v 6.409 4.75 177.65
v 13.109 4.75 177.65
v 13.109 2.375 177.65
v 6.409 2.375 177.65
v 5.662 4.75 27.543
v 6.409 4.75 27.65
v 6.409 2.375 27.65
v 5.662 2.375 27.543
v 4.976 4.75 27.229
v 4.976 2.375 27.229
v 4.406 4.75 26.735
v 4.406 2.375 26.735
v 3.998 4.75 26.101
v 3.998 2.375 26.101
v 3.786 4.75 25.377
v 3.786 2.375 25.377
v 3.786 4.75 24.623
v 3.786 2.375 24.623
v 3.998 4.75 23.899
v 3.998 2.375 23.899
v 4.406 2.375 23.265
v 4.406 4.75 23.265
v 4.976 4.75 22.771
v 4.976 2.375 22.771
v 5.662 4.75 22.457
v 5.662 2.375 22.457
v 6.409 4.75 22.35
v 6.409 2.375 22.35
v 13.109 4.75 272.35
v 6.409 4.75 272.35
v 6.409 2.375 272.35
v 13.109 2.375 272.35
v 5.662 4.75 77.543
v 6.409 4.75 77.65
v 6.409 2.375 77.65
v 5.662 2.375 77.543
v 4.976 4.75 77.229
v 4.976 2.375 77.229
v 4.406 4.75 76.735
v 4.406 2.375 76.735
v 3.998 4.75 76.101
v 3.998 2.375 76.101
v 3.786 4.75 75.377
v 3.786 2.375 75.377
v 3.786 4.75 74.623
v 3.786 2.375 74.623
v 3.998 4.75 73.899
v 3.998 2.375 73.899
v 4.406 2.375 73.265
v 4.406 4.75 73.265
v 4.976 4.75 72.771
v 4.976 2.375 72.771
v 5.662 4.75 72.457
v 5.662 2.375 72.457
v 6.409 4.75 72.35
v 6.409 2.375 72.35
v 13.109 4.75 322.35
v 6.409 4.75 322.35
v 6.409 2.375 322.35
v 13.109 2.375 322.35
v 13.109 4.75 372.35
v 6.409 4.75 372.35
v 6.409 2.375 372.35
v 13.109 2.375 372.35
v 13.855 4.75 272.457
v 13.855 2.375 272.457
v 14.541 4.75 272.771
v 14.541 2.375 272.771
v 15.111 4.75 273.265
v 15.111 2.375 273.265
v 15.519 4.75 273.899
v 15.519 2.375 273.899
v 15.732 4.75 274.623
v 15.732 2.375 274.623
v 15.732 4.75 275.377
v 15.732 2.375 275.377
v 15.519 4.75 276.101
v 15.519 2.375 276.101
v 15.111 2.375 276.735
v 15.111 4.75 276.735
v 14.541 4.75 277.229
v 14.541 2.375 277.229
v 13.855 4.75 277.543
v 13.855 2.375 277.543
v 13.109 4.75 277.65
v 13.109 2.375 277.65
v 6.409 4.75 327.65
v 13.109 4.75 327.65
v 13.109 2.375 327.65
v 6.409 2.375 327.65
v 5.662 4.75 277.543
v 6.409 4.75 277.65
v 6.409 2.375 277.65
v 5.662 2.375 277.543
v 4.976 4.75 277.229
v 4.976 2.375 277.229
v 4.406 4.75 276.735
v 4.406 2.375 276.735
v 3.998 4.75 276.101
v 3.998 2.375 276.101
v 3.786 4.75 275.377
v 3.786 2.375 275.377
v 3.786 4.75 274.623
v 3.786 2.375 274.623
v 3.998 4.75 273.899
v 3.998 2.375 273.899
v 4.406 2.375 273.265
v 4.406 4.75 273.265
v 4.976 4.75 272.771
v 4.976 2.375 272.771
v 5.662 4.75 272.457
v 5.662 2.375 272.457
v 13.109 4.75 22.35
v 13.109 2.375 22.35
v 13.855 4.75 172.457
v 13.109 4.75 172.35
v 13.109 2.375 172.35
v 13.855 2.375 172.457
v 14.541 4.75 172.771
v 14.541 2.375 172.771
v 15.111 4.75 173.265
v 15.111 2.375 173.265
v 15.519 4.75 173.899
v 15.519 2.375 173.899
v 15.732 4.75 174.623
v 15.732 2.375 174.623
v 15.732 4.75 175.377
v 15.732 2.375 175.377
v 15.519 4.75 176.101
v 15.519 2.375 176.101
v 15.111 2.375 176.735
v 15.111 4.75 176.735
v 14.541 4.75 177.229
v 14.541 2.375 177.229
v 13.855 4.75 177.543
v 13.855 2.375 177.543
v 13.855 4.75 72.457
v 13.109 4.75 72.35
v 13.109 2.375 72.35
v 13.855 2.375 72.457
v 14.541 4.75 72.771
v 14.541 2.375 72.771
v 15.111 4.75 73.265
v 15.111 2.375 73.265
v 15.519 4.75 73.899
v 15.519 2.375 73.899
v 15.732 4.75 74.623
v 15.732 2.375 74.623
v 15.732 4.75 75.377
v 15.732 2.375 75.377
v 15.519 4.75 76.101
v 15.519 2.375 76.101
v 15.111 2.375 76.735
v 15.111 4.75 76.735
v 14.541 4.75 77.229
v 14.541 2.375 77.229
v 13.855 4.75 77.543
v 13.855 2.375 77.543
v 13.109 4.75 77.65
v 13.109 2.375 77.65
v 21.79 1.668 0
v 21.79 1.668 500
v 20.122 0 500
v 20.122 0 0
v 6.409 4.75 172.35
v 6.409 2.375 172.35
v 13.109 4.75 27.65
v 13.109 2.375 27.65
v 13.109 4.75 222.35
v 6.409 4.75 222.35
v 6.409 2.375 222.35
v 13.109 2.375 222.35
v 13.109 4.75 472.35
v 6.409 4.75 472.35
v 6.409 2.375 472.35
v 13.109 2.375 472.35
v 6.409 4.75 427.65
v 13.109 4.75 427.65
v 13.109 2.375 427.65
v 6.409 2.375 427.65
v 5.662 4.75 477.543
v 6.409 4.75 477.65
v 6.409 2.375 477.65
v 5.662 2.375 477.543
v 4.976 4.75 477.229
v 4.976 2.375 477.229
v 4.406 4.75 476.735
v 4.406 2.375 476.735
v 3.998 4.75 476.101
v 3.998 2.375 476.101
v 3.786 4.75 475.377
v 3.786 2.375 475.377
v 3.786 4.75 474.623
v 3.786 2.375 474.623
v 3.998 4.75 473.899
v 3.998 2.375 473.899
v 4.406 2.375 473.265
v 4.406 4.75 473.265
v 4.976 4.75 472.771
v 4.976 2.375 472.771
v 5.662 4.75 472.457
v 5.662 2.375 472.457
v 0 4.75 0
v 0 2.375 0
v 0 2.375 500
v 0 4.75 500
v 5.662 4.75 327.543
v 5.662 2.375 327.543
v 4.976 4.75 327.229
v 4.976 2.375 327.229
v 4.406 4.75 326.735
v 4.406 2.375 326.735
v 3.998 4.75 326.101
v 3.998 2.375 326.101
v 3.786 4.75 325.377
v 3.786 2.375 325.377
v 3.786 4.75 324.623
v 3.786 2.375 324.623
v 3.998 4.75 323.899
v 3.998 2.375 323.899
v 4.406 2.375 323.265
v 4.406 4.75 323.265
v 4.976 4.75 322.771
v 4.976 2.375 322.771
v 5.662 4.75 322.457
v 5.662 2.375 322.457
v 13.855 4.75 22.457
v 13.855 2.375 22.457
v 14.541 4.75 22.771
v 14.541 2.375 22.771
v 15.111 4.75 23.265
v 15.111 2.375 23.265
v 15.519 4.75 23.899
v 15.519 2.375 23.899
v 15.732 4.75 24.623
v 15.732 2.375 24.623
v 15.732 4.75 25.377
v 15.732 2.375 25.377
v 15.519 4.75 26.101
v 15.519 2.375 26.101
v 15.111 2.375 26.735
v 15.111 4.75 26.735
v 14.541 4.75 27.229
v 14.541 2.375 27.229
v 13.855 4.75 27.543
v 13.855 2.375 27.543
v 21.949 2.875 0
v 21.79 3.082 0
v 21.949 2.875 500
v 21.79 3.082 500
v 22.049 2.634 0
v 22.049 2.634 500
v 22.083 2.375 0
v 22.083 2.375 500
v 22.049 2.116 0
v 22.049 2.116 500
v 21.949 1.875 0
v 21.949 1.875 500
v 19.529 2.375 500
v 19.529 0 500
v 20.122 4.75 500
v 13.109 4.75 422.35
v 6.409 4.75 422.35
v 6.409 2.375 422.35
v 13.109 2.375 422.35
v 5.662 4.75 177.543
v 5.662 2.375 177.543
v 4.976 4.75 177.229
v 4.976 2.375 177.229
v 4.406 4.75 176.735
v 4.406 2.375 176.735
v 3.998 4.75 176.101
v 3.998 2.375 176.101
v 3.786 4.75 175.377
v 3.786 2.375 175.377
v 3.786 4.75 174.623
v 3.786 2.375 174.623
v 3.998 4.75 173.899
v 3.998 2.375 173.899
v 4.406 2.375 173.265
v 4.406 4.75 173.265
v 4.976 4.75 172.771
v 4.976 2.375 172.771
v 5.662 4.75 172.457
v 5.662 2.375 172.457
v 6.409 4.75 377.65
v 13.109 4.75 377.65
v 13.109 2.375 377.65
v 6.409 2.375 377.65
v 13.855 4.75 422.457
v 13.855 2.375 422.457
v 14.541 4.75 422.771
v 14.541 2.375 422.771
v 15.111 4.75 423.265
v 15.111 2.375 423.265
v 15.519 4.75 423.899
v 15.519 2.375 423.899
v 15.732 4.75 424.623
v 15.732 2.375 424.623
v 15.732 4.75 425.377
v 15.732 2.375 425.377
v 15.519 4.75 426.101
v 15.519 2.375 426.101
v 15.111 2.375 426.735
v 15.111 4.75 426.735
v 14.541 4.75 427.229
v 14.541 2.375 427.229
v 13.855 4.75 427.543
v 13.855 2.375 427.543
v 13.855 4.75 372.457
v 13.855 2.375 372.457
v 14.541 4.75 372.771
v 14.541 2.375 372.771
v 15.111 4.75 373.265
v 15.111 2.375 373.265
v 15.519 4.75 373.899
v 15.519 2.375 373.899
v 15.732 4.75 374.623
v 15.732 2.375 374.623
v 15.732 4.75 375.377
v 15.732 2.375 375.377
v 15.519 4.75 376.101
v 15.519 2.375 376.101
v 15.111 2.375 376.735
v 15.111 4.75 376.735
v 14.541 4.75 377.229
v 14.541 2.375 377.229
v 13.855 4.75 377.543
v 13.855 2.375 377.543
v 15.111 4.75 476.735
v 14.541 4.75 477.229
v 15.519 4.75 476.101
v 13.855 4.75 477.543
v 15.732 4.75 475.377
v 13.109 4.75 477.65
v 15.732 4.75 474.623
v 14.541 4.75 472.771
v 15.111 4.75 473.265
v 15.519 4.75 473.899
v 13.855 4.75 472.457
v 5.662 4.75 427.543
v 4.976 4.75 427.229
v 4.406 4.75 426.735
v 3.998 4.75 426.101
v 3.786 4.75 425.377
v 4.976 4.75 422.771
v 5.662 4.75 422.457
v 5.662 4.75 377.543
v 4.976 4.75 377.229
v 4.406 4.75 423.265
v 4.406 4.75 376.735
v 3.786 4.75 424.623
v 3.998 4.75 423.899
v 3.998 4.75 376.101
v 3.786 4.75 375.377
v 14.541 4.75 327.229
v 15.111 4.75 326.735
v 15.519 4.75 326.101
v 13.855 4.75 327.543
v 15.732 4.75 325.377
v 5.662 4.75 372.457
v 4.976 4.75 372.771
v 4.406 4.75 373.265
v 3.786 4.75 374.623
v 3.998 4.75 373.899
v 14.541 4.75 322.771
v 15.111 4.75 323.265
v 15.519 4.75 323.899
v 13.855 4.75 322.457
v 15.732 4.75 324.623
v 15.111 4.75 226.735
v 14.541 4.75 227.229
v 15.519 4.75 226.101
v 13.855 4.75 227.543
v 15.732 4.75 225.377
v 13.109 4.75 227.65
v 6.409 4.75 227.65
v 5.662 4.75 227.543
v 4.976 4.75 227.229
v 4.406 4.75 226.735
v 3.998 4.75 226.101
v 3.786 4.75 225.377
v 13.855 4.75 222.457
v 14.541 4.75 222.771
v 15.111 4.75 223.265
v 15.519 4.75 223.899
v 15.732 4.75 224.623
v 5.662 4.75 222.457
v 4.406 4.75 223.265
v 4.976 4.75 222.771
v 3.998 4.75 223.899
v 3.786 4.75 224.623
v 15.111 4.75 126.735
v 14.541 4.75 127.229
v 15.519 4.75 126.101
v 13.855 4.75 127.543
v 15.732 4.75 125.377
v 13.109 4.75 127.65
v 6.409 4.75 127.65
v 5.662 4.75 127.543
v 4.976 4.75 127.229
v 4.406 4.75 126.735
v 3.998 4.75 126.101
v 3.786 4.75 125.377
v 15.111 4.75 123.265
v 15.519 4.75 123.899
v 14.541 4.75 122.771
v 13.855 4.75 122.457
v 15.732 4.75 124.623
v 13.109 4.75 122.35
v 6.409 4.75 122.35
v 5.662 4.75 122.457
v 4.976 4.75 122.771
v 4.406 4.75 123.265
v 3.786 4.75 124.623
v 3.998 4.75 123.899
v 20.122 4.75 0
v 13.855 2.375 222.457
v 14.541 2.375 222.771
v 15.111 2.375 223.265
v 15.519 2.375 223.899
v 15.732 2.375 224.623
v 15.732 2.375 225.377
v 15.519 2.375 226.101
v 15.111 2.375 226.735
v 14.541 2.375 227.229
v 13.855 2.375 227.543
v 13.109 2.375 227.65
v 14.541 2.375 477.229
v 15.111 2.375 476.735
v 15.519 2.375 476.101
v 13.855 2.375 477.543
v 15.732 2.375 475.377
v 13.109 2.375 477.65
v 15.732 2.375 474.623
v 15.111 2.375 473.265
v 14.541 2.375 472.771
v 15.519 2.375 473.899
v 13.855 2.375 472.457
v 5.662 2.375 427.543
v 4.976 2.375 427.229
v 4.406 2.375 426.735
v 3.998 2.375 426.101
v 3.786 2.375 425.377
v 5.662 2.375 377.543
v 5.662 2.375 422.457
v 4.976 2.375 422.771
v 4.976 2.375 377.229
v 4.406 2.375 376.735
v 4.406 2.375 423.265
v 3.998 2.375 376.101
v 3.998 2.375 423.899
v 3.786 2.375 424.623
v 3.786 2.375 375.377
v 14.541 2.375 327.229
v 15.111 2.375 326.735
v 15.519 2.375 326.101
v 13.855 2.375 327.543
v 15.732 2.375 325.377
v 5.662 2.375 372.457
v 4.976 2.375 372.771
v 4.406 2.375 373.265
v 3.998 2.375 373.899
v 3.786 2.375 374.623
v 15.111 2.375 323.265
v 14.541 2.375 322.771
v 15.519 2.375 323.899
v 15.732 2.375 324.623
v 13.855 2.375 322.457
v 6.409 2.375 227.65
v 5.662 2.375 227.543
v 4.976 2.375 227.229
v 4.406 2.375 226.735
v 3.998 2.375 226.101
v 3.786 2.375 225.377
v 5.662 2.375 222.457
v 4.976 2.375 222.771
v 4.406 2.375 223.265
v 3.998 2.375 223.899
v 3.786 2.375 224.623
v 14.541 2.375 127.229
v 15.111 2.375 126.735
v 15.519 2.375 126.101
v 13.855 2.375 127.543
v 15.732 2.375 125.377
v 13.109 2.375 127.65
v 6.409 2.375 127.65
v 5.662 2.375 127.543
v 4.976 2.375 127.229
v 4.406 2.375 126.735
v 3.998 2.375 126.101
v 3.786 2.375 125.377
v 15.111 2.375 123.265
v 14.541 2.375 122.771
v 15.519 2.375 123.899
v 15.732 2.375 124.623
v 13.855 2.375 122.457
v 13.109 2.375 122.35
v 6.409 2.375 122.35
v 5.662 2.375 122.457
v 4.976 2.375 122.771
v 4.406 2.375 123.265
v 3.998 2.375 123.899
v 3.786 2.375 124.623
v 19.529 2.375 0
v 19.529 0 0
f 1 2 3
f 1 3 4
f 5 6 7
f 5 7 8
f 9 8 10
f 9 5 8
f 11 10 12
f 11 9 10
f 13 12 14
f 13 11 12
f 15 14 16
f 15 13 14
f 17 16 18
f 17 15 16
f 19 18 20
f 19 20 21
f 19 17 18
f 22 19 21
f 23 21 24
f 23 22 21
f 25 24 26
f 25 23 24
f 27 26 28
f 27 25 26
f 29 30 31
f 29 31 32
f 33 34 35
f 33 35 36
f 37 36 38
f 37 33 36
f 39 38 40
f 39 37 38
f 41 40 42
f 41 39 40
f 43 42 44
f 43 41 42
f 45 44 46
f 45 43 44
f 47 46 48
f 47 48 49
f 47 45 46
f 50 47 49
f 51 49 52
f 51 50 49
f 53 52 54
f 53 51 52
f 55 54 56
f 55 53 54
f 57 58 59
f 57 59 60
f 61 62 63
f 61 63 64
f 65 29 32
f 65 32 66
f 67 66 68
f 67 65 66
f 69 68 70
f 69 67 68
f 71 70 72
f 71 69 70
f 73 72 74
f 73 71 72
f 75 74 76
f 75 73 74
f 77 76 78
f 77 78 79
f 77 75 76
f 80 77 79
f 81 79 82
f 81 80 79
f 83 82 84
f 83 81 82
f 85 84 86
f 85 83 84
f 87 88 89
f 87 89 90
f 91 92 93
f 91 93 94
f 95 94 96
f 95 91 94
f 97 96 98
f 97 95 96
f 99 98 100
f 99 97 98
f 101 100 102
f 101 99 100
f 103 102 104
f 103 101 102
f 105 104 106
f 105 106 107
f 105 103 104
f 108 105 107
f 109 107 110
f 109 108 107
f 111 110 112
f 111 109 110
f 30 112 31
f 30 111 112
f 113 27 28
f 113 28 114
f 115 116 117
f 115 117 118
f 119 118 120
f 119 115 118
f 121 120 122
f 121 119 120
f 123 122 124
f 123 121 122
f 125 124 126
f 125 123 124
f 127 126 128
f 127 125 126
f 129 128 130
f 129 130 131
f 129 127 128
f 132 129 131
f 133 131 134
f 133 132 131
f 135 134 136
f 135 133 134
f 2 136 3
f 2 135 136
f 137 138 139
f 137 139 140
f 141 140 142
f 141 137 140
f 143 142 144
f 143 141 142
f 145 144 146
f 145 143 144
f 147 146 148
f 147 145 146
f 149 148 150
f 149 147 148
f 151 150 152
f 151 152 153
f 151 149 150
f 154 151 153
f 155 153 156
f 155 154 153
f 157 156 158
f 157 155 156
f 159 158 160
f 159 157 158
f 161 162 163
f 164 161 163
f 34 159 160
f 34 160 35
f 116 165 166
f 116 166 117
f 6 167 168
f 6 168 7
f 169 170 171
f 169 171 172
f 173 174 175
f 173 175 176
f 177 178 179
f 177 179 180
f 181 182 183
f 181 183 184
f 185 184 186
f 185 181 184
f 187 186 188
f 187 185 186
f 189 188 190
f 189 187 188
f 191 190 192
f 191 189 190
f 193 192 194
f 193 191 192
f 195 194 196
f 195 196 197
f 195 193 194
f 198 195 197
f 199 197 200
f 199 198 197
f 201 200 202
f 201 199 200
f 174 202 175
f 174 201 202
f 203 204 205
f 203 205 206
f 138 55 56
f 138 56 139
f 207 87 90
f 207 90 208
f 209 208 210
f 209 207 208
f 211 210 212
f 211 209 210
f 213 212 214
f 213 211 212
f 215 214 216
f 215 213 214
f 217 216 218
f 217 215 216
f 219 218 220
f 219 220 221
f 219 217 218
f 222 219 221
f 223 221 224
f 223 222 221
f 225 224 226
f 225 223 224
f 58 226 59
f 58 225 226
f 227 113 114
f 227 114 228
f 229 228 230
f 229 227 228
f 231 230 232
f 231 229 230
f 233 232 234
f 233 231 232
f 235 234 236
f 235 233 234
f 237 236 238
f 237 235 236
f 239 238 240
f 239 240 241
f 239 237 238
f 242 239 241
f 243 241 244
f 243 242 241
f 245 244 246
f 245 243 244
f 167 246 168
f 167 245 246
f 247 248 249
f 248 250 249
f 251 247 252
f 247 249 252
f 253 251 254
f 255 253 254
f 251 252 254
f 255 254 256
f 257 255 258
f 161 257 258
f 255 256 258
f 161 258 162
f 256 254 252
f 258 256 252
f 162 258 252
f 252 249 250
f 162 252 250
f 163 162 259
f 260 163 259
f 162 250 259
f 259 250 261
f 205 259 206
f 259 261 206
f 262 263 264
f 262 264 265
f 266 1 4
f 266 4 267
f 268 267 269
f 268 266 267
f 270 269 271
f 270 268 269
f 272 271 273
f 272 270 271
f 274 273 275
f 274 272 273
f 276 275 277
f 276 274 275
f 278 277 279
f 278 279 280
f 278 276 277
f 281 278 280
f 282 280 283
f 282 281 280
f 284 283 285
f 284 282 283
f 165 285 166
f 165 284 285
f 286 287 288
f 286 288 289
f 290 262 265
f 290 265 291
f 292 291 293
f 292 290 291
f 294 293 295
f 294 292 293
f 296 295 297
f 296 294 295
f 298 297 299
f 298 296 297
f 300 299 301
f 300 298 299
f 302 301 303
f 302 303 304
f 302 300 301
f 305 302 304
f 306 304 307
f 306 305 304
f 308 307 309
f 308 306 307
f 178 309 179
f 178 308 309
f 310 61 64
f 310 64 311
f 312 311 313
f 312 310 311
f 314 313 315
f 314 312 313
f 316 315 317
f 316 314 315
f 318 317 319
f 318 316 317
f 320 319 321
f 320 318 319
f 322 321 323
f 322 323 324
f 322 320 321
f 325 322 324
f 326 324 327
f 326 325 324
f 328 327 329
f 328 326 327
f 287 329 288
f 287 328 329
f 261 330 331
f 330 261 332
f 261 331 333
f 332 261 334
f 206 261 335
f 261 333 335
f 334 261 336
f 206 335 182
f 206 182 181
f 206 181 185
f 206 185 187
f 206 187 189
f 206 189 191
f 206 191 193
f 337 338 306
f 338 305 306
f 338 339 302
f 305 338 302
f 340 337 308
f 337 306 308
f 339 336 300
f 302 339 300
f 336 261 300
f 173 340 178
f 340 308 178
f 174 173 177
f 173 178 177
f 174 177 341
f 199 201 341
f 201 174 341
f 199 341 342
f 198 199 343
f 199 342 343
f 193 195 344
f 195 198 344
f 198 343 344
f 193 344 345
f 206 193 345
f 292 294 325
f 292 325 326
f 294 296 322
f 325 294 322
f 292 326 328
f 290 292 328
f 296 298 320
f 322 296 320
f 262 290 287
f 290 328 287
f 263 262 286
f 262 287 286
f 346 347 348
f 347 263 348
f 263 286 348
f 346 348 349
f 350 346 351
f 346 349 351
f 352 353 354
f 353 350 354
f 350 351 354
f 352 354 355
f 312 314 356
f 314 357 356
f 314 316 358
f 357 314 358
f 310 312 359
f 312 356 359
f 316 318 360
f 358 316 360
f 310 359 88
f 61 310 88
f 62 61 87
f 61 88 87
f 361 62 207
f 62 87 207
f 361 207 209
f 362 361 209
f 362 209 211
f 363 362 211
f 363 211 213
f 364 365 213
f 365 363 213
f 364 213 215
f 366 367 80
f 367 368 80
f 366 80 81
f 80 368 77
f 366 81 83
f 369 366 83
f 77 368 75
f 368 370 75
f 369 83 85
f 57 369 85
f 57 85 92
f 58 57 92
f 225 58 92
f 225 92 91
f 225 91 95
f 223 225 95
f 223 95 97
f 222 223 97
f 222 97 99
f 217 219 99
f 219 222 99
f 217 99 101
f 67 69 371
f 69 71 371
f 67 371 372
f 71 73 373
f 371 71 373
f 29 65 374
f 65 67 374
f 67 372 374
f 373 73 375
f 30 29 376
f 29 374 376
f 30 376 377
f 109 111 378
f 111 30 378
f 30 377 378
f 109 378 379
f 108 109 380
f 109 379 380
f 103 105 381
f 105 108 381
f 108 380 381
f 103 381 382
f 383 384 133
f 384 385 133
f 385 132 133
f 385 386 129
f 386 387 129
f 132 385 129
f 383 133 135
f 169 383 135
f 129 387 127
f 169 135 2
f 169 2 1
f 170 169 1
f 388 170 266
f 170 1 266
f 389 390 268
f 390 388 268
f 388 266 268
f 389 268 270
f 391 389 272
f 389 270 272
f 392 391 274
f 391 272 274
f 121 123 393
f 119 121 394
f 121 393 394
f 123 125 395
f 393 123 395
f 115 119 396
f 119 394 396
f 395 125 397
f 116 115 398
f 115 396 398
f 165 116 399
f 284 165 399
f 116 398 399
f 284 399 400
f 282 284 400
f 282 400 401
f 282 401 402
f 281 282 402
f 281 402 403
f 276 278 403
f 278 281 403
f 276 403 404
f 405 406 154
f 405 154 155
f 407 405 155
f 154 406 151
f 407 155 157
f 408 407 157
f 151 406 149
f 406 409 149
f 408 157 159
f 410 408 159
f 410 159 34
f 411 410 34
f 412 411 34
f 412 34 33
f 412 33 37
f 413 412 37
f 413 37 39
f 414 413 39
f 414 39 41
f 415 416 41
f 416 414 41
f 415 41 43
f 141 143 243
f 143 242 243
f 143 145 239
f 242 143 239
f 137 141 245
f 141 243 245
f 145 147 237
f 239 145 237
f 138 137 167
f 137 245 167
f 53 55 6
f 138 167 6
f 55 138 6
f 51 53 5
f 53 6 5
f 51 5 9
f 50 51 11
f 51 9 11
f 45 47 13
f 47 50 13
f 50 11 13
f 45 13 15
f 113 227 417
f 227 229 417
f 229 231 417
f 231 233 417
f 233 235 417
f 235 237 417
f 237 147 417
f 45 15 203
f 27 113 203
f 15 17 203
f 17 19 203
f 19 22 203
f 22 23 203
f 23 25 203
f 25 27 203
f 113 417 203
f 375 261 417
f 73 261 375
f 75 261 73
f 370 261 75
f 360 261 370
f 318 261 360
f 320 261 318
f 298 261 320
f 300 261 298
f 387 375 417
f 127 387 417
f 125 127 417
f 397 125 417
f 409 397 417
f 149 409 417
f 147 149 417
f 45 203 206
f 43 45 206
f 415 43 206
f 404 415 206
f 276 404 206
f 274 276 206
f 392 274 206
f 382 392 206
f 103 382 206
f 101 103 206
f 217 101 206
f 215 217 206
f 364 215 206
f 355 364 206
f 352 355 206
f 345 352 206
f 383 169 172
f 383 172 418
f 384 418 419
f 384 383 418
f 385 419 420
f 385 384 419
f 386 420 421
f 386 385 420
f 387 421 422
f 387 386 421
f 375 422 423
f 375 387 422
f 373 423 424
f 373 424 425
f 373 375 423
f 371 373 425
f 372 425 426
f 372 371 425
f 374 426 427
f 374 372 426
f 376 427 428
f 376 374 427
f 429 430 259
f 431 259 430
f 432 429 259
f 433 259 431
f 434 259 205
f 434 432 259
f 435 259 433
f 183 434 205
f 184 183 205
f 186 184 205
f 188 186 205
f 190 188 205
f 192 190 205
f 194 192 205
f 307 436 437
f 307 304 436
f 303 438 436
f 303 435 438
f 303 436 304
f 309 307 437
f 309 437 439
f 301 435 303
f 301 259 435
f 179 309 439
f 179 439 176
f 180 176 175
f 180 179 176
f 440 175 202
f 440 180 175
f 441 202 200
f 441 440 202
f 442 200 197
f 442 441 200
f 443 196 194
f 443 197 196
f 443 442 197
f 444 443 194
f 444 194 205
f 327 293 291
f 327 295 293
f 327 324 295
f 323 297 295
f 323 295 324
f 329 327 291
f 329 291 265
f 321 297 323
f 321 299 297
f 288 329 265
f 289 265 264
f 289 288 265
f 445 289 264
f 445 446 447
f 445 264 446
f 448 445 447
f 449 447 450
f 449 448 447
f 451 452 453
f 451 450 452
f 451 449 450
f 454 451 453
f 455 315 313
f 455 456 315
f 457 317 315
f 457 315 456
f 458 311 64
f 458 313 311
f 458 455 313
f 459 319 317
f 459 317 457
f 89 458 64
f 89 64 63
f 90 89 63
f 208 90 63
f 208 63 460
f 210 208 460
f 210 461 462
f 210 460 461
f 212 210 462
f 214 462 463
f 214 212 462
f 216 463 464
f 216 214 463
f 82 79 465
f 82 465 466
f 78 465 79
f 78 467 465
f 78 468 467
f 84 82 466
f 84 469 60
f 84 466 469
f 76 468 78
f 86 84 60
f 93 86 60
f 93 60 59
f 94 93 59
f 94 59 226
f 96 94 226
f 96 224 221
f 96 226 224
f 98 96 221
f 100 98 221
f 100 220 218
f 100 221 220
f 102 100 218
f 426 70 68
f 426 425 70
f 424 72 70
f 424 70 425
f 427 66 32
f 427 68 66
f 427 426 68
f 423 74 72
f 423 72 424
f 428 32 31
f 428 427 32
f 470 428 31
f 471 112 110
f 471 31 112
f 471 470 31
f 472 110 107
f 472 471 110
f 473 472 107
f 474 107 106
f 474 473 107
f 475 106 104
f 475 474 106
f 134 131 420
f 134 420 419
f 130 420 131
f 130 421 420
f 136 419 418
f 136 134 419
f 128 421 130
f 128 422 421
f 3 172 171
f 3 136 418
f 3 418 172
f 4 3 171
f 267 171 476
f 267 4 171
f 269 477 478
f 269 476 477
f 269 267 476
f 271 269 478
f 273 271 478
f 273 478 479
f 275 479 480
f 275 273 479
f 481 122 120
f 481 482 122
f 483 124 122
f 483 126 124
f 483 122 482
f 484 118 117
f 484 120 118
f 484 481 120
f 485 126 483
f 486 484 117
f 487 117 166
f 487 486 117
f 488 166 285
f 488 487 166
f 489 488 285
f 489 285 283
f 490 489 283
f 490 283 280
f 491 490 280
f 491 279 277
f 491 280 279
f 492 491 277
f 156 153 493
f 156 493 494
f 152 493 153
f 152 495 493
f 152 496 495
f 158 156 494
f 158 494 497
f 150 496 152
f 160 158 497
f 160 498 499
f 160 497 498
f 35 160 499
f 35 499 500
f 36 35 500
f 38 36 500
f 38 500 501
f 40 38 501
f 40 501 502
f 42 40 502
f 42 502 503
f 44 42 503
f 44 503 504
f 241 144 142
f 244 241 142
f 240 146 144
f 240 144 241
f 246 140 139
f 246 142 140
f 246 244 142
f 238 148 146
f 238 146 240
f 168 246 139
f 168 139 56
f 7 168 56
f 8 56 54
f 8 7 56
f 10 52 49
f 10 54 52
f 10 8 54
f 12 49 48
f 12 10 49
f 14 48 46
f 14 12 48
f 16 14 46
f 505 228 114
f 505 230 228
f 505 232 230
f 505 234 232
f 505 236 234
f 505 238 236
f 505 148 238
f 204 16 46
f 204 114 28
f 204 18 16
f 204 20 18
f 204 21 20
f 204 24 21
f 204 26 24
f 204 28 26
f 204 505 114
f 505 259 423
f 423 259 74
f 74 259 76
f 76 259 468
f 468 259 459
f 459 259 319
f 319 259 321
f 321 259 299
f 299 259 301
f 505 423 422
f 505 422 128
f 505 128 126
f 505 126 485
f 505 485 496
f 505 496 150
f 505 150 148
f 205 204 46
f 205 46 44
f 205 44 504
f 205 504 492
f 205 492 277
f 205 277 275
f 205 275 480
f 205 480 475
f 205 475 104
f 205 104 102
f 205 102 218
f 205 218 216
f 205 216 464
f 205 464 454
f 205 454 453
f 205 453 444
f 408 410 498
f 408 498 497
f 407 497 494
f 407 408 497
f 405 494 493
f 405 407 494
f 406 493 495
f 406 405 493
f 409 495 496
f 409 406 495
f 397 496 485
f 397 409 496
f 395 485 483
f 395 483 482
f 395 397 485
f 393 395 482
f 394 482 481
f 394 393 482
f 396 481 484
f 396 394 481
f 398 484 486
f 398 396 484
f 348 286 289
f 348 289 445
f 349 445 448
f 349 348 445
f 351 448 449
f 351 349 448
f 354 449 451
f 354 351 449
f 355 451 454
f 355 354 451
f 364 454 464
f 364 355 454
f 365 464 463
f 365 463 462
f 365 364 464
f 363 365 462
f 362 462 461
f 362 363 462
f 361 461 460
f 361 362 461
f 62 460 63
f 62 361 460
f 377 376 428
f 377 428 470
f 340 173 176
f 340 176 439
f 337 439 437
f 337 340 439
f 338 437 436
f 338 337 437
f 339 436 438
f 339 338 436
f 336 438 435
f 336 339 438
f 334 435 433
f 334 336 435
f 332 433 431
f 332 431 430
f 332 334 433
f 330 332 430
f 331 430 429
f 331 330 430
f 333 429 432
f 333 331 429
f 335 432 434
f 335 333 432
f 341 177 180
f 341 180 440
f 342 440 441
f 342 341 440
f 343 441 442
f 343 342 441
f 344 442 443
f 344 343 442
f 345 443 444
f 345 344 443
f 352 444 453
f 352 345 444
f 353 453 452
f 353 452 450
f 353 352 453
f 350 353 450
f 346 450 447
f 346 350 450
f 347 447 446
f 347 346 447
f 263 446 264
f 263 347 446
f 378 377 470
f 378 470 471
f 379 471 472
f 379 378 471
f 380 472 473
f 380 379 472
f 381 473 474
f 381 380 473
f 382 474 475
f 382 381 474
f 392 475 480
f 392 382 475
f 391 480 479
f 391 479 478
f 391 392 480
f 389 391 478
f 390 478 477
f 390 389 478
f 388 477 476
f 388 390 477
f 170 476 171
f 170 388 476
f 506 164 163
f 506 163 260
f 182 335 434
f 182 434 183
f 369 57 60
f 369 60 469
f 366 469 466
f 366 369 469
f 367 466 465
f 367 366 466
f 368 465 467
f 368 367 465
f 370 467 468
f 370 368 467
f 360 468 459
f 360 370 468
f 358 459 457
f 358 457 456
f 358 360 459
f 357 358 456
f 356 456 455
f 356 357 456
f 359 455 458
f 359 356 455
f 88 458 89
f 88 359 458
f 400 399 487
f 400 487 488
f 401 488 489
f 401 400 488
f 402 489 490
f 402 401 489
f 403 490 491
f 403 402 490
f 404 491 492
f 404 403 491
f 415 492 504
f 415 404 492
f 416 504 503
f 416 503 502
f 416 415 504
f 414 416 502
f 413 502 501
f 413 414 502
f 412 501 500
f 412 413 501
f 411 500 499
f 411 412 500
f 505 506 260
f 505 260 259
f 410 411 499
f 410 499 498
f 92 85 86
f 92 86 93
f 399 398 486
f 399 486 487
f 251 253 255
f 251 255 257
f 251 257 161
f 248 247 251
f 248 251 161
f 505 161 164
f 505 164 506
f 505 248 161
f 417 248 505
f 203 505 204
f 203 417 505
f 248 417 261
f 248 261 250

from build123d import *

# Parameters (mm, degrees)
BOSS_EXTRUDE1_DEPTH = 500
CUT_EXTRUDE1_DEPTH  = 2.375
LPATTERN1_COUNT     = 10
LPATTERN1_PITCH     = 50
FILLET1_R           = 1


with BuildPart() as part:
    # Sketch1 → Boss-Extrude1 (new body)
    with BuildSketch(Plane.XY):
        Polygon((19.5291, 2.375), (0, 2.375), (0, 4.75), (19.5291, 4.75), (20.122, 4.75), (22.497, 2.375), (20.122, 0), (19.5291, 0), align=None)
    extrude(amount=BOSS_EXTRUDE1_DEPTH)

    # Sketch2 → Cut-Extrude1 (cut)
    with BuildSketch(Plane(origin=(0, 4.75, 0), x_dir=(1, 0, 0), z_dir=(0, 1, 0))):
        with BuildLine():
            Line((6.4087, -22.35), (13.1087, -22.35))
            ThreePointArc((13.1087, -22.35), (15.7587, -25), (13.1087, -27.65))
            Line((13.1087, -27.65), (6.4087, -27.65))
            ThreePointArc((6.4087, -27.65), (3.7587, -25), (6.4087, -22.35))
        make_face()
    cut_extrude1 = extrude(amount=-CUT_EXTRUDE1_DEPTH, mode=Mode.SUBTRACT)

    # LPattern1: Cut-Extrude1 ×10
    with Locations(*[(0, 0, i * LPATTERN1_PITCH) for i in range(1, LPATTERN1_COUNT)]):
        add(cut_extrude1, mode=Mode.SUBTRACT)

    # Fillet1
    fillet1_edges = [part.edges().sort_by_distance(p)[0] for p in [
        (22.497, 2.375, 250),
    ]]
    fillet(fillet1_edges, radius=FILLET1_R)


solid = part.part
